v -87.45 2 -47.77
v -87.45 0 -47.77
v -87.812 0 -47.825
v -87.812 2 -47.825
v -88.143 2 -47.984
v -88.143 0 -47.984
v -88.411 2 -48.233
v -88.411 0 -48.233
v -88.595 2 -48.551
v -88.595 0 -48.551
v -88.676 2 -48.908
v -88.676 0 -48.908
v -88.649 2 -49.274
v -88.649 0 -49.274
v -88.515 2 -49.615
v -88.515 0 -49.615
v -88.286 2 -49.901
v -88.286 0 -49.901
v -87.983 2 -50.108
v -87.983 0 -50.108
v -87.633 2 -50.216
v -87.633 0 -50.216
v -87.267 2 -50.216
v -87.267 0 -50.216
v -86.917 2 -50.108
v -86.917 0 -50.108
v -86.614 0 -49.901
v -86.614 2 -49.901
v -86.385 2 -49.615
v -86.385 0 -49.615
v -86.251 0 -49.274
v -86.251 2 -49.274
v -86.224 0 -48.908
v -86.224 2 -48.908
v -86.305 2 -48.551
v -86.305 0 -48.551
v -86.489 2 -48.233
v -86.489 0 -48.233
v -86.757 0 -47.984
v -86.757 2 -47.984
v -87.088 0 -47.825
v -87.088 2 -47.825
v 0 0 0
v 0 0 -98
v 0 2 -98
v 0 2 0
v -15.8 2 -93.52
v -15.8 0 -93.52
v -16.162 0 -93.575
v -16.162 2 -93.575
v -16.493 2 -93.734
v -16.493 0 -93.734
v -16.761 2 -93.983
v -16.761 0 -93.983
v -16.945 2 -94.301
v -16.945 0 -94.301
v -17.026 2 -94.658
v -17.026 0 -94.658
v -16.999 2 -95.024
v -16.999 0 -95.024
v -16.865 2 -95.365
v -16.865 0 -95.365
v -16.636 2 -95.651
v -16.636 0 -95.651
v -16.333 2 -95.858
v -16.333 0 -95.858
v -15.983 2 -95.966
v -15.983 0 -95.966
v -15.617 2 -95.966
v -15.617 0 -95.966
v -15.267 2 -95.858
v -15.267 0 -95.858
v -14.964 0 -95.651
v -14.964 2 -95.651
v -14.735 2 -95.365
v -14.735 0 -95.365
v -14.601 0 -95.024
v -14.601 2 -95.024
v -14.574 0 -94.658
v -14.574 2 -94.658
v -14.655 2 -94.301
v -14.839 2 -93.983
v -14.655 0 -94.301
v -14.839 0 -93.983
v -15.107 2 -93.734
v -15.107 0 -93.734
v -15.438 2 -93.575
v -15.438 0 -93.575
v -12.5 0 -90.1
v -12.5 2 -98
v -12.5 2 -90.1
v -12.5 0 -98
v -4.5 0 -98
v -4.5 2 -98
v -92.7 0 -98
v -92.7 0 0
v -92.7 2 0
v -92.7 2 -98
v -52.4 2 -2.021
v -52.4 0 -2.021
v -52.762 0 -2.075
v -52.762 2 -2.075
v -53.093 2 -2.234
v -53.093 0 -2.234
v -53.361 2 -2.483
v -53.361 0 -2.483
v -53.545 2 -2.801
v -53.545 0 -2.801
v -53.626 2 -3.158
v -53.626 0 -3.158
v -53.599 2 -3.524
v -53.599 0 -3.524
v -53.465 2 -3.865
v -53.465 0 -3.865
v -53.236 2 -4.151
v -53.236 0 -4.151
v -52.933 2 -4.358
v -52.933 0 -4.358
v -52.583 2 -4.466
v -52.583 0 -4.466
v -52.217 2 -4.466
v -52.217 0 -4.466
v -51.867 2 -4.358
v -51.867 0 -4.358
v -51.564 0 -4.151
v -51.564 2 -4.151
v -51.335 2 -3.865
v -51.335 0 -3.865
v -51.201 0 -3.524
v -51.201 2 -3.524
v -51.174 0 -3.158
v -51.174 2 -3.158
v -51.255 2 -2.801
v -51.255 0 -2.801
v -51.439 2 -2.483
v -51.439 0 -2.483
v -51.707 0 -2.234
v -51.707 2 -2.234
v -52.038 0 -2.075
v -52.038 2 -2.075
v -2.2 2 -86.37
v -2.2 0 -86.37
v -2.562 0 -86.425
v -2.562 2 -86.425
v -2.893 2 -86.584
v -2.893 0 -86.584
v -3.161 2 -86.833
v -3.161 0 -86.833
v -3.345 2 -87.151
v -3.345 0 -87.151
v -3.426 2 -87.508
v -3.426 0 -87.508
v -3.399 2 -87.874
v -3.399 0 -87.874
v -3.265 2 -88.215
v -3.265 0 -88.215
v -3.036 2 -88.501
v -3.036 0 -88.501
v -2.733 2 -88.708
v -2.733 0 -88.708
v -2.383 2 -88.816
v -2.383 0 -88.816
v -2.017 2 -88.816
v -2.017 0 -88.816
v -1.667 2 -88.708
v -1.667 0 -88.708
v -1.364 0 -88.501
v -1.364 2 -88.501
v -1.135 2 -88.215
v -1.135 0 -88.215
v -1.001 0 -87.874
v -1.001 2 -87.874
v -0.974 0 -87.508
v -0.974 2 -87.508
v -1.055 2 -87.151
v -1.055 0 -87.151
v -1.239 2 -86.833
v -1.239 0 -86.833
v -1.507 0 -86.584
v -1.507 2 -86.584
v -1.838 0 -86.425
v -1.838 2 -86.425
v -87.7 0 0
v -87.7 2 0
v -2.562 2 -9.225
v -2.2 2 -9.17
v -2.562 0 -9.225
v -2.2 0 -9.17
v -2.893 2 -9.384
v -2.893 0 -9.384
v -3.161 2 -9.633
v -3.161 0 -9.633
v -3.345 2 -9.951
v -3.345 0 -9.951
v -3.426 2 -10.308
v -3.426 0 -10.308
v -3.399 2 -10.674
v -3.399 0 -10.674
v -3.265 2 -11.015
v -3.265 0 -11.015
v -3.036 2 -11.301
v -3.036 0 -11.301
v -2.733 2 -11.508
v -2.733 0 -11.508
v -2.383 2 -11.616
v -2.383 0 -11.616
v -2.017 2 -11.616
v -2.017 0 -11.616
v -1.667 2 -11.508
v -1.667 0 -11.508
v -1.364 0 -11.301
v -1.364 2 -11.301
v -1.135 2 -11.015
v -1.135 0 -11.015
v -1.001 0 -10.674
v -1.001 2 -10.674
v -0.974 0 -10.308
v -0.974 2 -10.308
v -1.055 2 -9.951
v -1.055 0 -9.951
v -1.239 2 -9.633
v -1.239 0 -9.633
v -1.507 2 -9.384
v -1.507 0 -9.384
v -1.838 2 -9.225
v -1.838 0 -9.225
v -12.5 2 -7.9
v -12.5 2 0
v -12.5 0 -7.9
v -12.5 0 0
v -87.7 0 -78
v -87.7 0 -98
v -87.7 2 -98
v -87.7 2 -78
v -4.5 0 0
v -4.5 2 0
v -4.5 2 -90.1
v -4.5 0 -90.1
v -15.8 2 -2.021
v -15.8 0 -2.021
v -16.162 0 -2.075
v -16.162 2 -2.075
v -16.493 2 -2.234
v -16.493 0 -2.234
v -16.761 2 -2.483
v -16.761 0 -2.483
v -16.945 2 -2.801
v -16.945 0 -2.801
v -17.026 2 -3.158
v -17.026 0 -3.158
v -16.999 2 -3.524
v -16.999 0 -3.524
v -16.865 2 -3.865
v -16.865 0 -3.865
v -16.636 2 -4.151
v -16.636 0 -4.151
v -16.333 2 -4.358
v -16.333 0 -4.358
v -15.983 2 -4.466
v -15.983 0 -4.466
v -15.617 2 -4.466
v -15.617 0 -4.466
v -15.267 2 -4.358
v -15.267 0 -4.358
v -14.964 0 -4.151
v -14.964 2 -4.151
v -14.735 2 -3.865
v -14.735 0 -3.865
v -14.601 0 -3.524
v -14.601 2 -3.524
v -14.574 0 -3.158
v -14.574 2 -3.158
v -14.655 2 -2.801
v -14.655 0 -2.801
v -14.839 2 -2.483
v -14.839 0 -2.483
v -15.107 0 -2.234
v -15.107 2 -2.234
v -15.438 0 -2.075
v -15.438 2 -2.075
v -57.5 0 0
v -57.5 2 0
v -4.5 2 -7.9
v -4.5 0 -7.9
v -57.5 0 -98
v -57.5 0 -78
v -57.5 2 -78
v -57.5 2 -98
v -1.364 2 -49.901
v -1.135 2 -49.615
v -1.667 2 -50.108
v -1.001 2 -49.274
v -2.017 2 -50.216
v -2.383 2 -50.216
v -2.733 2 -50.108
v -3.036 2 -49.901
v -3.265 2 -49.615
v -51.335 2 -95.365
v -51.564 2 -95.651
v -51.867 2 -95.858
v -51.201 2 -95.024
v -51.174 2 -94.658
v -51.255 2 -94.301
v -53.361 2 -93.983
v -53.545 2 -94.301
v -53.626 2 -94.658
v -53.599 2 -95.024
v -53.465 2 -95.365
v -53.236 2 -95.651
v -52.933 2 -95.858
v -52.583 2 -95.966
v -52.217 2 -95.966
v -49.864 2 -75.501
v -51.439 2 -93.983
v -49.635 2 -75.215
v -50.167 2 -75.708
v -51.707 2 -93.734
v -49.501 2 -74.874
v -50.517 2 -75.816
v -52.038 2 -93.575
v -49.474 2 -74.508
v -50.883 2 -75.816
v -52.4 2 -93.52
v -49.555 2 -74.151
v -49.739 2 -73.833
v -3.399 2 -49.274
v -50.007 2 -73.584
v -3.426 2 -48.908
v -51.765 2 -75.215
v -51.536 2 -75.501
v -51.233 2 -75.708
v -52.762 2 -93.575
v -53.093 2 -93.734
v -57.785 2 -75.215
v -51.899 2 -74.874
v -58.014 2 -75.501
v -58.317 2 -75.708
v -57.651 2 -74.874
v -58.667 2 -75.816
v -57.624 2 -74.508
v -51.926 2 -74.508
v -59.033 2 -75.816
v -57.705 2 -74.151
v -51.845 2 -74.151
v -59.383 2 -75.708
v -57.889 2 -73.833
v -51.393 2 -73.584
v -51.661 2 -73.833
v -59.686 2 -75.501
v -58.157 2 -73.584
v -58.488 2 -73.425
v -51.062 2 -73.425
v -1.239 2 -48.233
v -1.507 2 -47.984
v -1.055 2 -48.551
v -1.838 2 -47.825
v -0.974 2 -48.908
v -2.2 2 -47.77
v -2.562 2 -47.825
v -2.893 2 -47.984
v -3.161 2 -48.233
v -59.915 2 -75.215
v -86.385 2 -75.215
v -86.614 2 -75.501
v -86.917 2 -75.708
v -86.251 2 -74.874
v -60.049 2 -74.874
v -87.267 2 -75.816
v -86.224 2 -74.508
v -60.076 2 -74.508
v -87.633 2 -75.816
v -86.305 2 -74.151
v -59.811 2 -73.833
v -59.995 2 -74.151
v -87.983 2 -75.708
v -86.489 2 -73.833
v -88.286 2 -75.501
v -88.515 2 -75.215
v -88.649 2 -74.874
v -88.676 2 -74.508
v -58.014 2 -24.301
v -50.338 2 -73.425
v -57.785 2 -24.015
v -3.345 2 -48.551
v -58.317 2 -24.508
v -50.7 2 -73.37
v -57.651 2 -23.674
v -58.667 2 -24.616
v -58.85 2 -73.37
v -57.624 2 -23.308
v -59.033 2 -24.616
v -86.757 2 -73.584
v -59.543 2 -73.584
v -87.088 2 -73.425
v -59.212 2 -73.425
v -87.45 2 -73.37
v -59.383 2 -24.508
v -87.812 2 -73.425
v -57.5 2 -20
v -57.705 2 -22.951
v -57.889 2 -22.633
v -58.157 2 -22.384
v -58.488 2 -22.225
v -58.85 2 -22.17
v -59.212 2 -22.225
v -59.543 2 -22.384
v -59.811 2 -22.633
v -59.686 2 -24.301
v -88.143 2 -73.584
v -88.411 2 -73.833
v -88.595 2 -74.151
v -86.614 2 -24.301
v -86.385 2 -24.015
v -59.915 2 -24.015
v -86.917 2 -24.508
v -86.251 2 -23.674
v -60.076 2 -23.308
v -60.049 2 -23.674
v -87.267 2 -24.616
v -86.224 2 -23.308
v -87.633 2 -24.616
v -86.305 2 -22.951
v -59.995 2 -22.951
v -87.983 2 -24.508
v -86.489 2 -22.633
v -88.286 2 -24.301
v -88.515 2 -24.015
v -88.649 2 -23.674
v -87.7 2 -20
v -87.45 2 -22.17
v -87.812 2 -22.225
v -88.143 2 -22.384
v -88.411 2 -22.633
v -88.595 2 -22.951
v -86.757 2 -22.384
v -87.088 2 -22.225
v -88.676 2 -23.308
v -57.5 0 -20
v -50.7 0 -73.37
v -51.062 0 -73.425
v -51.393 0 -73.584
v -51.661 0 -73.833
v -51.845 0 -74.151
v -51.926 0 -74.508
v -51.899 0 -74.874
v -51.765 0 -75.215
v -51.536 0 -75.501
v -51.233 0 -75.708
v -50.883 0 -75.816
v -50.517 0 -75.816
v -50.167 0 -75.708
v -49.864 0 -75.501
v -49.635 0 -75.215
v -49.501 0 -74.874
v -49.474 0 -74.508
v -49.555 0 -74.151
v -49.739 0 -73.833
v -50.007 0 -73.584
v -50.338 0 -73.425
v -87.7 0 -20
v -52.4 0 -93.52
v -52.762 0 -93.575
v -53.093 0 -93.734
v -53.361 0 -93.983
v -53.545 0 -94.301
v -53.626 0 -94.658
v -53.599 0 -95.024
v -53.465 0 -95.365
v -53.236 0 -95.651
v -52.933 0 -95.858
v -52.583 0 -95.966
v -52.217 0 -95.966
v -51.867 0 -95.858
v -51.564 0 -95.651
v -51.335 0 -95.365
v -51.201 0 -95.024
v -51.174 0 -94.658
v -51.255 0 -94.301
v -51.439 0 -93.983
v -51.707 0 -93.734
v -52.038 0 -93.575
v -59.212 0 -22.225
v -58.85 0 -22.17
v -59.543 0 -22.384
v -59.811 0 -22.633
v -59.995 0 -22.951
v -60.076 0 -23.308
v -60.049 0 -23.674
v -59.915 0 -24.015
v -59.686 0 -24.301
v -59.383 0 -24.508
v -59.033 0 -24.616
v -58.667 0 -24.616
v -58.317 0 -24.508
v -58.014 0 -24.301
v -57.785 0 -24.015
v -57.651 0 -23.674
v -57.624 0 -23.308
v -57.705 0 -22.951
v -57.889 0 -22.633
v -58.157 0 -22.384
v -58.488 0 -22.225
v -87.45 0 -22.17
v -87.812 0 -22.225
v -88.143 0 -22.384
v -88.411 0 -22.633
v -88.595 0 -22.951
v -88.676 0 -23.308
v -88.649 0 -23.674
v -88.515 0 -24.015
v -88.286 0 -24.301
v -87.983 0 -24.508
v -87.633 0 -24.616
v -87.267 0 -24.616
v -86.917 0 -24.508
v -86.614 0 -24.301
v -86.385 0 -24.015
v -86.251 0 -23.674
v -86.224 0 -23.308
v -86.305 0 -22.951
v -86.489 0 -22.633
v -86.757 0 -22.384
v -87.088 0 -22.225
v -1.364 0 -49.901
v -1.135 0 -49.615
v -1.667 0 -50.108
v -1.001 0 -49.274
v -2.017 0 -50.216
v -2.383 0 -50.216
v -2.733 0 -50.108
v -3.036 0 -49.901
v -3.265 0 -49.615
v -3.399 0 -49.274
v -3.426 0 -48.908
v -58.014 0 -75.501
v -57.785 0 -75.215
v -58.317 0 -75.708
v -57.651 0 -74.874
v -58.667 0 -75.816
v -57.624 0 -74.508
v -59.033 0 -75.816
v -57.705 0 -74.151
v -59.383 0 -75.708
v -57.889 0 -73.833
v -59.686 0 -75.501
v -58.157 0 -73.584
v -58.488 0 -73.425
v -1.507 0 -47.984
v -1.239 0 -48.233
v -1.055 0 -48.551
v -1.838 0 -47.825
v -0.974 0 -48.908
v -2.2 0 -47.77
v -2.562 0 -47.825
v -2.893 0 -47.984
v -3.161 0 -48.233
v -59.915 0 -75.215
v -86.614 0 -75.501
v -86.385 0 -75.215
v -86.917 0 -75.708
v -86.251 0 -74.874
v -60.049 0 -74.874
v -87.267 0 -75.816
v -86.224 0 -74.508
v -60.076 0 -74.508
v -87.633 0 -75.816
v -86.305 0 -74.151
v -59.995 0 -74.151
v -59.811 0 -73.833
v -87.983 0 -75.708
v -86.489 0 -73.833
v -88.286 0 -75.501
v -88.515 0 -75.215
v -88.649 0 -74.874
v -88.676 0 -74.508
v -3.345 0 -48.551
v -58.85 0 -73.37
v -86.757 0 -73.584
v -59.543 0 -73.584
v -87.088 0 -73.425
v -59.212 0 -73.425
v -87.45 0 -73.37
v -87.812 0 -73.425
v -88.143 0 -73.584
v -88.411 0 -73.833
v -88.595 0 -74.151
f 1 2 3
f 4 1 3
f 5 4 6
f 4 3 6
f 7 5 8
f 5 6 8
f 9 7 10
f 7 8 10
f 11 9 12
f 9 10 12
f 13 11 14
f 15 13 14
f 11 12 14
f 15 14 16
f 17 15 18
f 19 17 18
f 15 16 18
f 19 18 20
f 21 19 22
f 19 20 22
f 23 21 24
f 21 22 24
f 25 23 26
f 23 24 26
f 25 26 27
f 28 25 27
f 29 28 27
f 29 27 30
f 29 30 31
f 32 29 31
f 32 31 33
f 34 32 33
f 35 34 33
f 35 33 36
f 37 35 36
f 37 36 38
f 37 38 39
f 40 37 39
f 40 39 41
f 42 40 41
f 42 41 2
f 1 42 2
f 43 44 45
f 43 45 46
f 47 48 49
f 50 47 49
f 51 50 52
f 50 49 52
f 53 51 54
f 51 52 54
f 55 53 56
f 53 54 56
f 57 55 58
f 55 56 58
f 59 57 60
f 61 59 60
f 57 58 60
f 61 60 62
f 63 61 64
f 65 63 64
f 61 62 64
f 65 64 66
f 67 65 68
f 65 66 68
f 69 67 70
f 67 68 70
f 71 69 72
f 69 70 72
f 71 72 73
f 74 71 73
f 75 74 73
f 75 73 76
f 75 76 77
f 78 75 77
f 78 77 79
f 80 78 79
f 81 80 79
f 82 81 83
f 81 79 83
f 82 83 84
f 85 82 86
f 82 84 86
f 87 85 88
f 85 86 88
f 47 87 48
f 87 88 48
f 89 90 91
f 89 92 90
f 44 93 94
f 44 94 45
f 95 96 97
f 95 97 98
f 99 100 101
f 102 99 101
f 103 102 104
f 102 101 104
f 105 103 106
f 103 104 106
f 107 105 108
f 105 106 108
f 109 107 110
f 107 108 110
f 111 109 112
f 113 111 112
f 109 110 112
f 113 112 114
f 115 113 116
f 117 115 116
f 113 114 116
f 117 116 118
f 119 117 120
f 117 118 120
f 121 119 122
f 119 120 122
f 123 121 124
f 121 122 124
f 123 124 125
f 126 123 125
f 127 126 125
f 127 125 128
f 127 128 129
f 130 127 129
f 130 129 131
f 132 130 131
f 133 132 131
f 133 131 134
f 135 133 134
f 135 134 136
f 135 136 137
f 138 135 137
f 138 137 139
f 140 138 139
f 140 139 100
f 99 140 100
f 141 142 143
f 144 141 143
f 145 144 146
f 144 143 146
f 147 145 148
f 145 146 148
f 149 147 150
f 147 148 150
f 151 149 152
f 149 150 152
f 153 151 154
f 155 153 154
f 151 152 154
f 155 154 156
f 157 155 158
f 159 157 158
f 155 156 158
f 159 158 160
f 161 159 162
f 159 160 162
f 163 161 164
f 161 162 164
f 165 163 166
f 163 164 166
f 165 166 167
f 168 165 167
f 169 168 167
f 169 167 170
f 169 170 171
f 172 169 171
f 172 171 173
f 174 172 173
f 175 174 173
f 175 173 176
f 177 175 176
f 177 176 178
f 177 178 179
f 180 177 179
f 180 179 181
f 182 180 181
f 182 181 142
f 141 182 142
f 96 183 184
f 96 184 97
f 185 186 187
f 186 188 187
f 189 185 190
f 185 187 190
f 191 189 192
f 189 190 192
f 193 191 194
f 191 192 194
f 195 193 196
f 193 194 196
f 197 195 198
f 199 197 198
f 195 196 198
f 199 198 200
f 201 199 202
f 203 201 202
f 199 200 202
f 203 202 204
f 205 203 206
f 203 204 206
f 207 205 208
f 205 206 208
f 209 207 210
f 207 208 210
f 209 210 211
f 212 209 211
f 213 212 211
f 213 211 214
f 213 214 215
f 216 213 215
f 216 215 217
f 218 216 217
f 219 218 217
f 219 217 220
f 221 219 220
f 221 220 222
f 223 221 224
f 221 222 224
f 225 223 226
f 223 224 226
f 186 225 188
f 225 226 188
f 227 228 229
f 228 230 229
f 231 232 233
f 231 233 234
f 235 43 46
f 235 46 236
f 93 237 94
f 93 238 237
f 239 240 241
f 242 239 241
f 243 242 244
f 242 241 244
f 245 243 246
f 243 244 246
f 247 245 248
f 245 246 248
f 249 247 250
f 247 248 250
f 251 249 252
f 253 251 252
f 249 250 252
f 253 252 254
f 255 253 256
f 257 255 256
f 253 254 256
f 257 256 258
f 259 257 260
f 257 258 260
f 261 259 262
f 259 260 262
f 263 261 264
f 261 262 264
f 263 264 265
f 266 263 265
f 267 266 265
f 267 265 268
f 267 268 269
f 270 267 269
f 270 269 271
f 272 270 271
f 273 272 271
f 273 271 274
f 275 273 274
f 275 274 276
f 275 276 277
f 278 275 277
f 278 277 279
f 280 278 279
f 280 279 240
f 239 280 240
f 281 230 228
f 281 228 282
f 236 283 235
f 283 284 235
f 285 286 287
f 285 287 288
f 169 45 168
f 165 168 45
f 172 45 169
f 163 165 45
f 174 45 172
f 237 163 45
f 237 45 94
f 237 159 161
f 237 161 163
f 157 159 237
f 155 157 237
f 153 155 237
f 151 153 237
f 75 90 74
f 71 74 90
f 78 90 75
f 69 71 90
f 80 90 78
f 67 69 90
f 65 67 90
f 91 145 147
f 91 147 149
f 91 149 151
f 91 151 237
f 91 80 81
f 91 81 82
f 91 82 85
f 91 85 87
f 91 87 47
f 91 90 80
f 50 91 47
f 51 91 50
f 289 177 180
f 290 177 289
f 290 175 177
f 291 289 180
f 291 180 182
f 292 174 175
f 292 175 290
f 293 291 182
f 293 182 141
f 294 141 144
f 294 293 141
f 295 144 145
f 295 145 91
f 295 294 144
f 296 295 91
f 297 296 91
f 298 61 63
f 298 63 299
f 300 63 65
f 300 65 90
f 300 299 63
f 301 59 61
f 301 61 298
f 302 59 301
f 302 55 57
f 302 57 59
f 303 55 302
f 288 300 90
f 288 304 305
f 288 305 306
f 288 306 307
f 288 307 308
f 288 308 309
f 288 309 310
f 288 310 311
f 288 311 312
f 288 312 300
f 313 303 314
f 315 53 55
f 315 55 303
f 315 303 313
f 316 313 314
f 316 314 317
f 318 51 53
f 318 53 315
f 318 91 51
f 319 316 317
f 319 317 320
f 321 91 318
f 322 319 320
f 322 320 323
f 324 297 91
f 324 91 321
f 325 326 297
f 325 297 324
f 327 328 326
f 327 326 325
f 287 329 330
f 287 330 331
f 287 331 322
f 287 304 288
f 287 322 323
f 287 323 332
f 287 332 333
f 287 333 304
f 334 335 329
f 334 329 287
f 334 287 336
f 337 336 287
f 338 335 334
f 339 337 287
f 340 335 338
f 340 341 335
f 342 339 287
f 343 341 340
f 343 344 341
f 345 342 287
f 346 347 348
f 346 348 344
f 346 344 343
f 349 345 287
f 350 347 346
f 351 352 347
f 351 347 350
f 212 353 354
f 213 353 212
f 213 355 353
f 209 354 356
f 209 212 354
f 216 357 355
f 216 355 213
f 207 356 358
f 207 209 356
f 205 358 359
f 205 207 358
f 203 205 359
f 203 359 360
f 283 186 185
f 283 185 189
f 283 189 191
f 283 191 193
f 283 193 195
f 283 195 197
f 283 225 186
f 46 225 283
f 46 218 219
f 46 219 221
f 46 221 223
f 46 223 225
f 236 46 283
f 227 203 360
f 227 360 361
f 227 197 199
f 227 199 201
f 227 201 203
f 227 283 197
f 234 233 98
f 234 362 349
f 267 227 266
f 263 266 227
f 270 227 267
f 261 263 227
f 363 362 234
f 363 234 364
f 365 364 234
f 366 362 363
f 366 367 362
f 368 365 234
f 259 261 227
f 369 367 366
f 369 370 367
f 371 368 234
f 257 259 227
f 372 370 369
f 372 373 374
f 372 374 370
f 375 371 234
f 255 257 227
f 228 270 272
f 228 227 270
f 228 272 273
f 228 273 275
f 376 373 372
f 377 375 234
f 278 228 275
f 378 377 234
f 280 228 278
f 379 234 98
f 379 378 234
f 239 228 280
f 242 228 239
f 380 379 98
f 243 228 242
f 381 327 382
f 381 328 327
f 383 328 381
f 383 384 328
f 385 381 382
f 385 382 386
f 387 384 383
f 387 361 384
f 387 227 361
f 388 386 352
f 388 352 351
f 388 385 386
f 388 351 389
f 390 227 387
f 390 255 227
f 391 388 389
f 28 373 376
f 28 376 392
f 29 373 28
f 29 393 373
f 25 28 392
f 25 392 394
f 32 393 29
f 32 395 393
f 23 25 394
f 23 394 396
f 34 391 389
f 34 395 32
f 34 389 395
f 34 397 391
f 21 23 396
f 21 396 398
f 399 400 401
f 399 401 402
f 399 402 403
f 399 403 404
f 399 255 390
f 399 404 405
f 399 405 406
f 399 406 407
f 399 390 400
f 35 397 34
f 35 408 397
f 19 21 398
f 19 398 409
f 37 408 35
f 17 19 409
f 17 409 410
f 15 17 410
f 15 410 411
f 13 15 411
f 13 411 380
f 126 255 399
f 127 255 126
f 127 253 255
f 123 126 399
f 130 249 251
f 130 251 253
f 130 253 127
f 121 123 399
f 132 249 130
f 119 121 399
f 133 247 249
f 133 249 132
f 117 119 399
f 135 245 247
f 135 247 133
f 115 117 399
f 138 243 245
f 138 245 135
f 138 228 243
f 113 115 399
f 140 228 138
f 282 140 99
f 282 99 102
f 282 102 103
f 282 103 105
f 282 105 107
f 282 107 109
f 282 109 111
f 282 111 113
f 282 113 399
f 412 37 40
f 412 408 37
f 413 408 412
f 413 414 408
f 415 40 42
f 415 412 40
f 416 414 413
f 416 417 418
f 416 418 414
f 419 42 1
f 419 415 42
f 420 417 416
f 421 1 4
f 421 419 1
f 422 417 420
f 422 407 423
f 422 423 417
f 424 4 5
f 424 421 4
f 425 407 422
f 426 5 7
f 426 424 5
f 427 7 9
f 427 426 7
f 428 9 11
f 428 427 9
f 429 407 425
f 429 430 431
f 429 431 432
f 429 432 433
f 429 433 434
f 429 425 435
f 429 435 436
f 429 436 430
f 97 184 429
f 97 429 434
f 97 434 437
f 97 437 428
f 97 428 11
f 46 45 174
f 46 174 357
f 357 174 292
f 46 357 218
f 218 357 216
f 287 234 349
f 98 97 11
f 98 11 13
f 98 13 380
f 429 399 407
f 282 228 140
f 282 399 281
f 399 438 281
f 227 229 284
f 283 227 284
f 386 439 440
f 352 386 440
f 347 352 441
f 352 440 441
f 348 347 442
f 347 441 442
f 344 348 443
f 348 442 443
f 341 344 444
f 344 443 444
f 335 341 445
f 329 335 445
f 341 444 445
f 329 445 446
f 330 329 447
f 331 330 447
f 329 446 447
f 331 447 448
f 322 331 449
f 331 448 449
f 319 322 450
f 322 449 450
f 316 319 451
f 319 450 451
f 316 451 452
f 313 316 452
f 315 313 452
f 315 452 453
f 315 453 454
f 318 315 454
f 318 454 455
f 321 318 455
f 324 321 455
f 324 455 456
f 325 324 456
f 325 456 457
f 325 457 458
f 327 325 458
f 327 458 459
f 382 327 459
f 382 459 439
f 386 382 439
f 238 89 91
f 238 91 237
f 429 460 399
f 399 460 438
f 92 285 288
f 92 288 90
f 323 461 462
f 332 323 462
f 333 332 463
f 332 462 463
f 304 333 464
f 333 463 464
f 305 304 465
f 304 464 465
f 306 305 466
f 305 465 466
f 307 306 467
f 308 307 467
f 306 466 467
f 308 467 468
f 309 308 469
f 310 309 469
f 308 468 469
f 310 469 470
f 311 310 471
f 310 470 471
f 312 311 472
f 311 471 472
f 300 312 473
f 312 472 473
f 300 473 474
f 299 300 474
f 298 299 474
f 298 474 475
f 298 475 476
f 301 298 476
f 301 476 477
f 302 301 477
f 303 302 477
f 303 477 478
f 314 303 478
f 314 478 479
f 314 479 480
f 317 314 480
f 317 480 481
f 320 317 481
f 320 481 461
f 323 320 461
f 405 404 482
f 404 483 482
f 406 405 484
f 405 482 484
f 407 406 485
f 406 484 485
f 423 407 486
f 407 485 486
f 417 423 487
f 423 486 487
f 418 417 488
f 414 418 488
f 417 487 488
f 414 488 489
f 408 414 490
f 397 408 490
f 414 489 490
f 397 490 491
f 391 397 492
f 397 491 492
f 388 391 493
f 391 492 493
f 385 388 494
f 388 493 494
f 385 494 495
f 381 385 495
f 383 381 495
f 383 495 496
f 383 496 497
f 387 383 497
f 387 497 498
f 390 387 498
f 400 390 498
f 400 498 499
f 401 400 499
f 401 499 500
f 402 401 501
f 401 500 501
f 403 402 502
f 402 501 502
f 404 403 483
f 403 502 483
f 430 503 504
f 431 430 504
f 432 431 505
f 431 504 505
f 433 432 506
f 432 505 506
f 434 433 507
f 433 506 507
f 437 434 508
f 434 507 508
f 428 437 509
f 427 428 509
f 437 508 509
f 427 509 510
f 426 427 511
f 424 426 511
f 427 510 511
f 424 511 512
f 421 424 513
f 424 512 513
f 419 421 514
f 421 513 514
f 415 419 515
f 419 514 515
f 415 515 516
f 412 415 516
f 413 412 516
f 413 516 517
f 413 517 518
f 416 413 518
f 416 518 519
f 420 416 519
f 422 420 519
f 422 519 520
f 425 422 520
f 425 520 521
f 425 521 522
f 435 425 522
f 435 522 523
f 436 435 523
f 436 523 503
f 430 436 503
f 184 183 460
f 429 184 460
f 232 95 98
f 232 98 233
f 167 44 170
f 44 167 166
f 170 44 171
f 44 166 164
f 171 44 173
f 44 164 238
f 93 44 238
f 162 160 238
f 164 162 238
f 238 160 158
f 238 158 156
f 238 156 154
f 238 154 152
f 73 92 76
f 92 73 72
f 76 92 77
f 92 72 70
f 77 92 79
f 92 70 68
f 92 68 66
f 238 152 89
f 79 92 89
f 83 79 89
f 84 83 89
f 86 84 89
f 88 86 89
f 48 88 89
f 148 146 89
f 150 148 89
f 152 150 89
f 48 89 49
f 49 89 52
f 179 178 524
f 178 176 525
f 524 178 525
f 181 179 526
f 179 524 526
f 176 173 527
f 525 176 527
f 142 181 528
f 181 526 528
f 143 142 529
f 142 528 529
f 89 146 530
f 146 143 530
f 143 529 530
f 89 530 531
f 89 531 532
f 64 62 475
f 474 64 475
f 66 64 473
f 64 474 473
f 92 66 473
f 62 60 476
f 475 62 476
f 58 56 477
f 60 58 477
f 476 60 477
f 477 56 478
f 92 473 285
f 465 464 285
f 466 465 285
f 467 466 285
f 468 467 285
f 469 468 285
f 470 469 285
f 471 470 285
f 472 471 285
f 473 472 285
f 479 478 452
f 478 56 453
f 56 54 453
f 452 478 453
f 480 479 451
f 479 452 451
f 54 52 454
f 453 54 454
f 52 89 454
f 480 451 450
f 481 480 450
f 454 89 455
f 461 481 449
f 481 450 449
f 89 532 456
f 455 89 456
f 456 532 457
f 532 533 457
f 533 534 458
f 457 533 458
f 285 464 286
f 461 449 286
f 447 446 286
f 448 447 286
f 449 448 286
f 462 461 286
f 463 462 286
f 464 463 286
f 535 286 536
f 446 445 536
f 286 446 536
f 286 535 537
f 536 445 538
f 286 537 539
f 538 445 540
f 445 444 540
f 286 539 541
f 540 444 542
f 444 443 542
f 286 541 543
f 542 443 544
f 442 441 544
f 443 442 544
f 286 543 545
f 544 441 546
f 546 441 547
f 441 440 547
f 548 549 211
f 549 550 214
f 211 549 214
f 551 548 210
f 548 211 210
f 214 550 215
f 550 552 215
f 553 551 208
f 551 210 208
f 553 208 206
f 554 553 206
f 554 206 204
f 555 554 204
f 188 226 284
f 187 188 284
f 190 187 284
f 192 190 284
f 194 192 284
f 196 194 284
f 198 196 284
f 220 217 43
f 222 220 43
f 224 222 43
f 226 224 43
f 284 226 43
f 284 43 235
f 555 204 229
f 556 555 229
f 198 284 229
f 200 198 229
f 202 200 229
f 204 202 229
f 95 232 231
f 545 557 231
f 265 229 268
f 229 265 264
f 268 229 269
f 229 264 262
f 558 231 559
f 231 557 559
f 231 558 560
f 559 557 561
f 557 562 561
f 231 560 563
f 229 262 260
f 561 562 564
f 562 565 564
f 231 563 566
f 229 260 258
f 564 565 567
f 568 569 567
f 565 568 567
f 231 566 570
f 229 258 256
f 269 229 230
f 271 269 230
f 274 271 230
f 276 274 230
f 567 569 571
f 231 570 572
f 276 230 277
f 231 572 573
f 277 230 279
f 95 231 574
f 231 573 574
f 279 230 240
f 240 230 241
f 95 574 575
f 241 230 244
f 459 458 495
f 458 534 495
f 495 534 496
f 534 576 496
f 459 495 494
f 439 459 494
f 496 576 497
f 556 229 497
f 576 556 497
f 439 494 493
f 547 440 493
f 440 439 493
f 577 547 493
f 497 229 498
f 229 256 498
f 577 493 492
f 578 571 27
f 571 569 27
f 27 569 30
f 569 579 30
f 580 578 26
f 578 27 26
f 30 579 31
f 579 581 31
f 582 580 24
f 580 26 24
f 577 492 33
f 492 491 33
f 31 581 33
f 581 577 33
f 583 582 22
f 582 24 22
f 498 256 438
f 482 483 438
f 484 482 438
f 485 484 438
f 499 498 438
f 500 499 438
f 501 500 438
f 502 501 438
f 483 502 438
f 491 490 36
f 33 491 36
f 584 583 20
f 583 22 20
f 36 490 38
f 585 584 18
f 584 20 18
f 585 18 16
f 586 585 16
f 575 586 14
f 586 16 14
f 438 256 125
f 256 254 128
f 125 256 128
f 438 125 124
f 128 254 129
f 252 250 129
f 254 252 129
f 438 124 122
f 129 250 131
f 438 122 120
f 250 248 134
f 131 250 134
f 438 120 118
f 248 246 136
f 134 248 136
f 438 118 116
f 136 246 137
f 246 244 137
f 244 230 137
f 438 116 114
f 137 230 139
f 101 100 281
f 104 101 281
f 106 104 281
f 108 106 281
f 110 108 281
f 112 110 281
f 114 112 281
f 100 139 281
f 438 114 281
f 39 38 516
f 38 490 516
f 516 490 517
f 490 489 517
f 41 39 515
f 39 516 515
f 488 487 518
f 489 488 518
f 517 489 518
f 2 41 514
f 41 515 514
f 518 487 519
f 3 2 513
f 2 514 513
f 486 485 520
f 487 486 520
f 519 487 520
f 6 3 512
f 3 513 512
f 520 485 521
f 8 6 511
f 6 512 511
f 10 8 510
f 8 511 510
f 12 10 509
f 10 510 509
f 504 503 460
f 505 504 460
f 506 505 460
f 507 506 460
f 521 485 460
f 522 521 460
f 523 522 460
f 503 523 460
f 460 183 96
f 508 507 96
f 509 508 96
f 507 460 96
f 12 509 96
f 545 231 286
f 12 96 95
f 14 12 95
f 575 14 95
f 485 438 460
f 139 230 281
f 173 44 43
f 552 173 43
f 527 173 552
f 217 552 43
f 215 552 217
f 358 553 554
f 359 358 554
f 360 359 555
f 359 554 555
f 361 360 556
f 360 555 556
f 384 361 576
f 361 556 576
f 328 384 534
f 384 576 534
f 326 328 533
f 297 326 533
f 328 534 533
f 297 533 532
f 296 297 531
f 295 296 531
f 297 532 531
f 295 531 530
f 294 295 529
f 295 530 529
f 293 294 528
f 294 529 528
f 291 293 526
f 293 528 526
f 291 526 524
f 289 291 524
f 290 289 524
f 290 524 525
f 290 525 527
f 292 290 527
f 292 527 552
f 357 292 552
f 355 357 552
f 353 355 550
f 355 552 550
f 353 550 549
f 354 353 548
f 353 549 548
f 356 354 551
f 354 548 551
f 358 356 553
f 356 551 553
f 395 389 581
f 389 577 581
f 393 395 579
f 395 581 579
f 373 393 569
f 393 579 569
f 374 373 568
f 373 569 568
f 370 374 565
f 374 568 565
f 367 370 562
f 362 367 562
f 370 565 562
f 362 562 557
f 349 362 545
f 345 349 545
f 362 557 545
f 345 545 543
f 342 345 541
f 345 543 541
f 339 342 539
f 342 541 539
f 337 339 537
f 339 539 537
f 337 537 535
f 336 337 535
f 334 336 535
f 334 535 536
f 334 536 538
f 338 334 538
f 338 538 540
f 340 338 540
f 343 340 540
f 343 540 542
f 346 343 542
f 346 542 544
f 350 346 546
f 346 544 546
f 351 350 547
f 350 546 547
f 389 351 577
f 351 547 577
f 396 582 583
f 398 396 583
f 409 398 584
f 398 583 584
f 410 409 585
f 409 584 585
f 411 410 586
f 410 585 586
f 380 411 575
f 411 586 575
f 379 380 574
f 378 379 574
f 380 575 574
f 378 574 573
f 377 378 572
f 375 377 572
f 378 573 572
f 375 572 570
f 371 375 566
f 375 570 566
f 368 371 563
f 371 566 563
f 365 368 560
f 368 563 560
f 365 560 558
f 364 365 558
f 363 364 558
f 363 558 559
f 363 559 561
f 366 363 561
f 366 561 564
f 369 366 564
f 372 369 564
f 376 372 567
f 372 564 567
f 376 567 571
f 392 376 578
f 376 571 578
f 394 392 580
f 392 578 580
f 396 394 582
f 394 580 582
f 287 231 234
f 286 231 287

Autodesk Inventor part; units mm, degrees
ref_plane "YZ Plane" through (0, 0, 0) normal (1, 0, 0) x (0, 1, 0)
ref_plane "XZ Plane" through (0, 0, 0) normal (0, 1, 0) x (-1, 0, 0)
ref_plane "XY Plane" through (0, 0, 0) normal (0, 0, 1) x (1, 0, 0)
sketch "Szkic1" plane through (0, 0, 0) normal (0, 1, 0) x (-1, 0, 0)
  line L0 (0, 0) -> (92.7, 0)
  line L1 (92.7, 0) -> (92.7, -98)
  line L2 (92.7, -98) -> (0, -98)
  line L3 (0, -98) -> (0, 0)
  line L4 (4.5, -98) -> (12.5, -98)
  line L5 (12.5, -98) -> (12.5, -90.1)
  line L6 (12.5, -90.1) -> (4.5, -90.1)
  line L7 (4.5, -90.1) -> (4.5, -98)
  line L8 (57.5, -98) -> (87.7, -98)
  line L9 (87.7, -98) -> (87.7, -78)
  line L10 (87.7, -78) -> (57.5, -78)
  line L11 (57.5, -78) -> (57.5, -98)
  line L12 (92.7, -49) -> (0, -49) construction
  line L13 (92.7, 0) -> (0, 0)
  line L14 (4.5, 0) -> (12.5, 0)
  line L15 (12.5, 0) -> (12.5, -7.9)
  line L16 (12.5, -7.9) -> (4.5, -7.9)
  line L17 (4.5, -7.9) -> (4.5, 0)
  line L18 (57.5, 0) -> (87.7, 0)
  line L19 (87.7, 0) -> (87.7, -20)
  line L20 (87.7, -20) -> (57.5, -20)
  line L21 (57.5, -20) -> (57.5, 0)
  dimension "d0" = 92.7
  dimension "d1" = 98
  dimension "d2" = 57.5
  dimension "d3" = 30.2
  dimension "d4" = 20
  dimension "d5" = 7.9
  dimension "d6" = 8
  dimension "d8" = 4.5
extrude "Wyciągnięcie proste1" add sketch "Szkic1" along normal blind 2 contours L0 L17 L16 L15 L21 L20 L19 L1 L2 L9 L10 L11 L5 L6 L7 L3
sketch "Szkic2" plane through (0, 2, 0) normal (0, 1, 0) x (1, 0, 0)
  line L0 (0, 0) -> (0, 98) construction
  line L1 (0, 49) -> (-92.7, 49) construction
  line L2 (-92.7, 98) -> (-92.7, 0) construction
  line L3 (-2.2, 49) -> (-2.2, 87.6) construction
  line L4 (-52.4, 94.75) -> (-15.8, 94.75) construction
  line L5 (-87.45, 74.6) -> (-58.85, 74.6) construction
  line L6 (-87.45, 49) -> (-87.45, 74.6) construction
  line L7 (-57.5, 78) -> (-87.7, 78) construction
  line L8 (-12.5, 98) -> (-57.5, 98) construction
  line L9 (-12.5, 90.1) -> (-12.5, 98) construction
  line L10 (-52.4, 3.25) -> (-15.8, 3.25) construction
  line L11 (-87.45, 23.4) -> (-58.85, 23.4) construction
  line L12 (-57.5, 20) -> (-87.7, 20) construction
  line L13 (-12.5, 0) -> (-57.5, 0) construction
  line L14 (-12.5, 7.9) -> (-12.5, 0) construction
  point P0 (-2.2, 10.4)
  point P1 (-50.7, 74.6)
  dimension "d11" = 2.2
  dimension "d12" = 38.6
  dimension "d13" = 3.25
  dimension "d14" = 3.3
  dimension "d15" = 36.6
  dimension "d16" = 3.4
  dimension "d17" = 5.25
  dimension "d18" = 28.6
  dimension "d26" = 42
hole "Otwór1" at (-2.2, 2, -87.6) at (-2.2, 2, -49) at (-15.8, 2, -94.75) at (-52.4, 2, -94.75) at (-58.85, 2, -74.6) at (-87.45, 2, -74.6) at (-87.45, 2, -49) at (-52.4, 2, -3.25) at (-15.8, 2, -3.25) at (-87.45, 2, -23.4) at (-58.85, 2, -23.4) at (-2.2, 2, -10.4) at (-50.7, 2, -74.6) direction (0, -1, 0) diameter 2.459 end through all thread size "M3x0.5" class "6H" standard "ISO Metric profile"
properties part number "Blacha" material "Stal"
